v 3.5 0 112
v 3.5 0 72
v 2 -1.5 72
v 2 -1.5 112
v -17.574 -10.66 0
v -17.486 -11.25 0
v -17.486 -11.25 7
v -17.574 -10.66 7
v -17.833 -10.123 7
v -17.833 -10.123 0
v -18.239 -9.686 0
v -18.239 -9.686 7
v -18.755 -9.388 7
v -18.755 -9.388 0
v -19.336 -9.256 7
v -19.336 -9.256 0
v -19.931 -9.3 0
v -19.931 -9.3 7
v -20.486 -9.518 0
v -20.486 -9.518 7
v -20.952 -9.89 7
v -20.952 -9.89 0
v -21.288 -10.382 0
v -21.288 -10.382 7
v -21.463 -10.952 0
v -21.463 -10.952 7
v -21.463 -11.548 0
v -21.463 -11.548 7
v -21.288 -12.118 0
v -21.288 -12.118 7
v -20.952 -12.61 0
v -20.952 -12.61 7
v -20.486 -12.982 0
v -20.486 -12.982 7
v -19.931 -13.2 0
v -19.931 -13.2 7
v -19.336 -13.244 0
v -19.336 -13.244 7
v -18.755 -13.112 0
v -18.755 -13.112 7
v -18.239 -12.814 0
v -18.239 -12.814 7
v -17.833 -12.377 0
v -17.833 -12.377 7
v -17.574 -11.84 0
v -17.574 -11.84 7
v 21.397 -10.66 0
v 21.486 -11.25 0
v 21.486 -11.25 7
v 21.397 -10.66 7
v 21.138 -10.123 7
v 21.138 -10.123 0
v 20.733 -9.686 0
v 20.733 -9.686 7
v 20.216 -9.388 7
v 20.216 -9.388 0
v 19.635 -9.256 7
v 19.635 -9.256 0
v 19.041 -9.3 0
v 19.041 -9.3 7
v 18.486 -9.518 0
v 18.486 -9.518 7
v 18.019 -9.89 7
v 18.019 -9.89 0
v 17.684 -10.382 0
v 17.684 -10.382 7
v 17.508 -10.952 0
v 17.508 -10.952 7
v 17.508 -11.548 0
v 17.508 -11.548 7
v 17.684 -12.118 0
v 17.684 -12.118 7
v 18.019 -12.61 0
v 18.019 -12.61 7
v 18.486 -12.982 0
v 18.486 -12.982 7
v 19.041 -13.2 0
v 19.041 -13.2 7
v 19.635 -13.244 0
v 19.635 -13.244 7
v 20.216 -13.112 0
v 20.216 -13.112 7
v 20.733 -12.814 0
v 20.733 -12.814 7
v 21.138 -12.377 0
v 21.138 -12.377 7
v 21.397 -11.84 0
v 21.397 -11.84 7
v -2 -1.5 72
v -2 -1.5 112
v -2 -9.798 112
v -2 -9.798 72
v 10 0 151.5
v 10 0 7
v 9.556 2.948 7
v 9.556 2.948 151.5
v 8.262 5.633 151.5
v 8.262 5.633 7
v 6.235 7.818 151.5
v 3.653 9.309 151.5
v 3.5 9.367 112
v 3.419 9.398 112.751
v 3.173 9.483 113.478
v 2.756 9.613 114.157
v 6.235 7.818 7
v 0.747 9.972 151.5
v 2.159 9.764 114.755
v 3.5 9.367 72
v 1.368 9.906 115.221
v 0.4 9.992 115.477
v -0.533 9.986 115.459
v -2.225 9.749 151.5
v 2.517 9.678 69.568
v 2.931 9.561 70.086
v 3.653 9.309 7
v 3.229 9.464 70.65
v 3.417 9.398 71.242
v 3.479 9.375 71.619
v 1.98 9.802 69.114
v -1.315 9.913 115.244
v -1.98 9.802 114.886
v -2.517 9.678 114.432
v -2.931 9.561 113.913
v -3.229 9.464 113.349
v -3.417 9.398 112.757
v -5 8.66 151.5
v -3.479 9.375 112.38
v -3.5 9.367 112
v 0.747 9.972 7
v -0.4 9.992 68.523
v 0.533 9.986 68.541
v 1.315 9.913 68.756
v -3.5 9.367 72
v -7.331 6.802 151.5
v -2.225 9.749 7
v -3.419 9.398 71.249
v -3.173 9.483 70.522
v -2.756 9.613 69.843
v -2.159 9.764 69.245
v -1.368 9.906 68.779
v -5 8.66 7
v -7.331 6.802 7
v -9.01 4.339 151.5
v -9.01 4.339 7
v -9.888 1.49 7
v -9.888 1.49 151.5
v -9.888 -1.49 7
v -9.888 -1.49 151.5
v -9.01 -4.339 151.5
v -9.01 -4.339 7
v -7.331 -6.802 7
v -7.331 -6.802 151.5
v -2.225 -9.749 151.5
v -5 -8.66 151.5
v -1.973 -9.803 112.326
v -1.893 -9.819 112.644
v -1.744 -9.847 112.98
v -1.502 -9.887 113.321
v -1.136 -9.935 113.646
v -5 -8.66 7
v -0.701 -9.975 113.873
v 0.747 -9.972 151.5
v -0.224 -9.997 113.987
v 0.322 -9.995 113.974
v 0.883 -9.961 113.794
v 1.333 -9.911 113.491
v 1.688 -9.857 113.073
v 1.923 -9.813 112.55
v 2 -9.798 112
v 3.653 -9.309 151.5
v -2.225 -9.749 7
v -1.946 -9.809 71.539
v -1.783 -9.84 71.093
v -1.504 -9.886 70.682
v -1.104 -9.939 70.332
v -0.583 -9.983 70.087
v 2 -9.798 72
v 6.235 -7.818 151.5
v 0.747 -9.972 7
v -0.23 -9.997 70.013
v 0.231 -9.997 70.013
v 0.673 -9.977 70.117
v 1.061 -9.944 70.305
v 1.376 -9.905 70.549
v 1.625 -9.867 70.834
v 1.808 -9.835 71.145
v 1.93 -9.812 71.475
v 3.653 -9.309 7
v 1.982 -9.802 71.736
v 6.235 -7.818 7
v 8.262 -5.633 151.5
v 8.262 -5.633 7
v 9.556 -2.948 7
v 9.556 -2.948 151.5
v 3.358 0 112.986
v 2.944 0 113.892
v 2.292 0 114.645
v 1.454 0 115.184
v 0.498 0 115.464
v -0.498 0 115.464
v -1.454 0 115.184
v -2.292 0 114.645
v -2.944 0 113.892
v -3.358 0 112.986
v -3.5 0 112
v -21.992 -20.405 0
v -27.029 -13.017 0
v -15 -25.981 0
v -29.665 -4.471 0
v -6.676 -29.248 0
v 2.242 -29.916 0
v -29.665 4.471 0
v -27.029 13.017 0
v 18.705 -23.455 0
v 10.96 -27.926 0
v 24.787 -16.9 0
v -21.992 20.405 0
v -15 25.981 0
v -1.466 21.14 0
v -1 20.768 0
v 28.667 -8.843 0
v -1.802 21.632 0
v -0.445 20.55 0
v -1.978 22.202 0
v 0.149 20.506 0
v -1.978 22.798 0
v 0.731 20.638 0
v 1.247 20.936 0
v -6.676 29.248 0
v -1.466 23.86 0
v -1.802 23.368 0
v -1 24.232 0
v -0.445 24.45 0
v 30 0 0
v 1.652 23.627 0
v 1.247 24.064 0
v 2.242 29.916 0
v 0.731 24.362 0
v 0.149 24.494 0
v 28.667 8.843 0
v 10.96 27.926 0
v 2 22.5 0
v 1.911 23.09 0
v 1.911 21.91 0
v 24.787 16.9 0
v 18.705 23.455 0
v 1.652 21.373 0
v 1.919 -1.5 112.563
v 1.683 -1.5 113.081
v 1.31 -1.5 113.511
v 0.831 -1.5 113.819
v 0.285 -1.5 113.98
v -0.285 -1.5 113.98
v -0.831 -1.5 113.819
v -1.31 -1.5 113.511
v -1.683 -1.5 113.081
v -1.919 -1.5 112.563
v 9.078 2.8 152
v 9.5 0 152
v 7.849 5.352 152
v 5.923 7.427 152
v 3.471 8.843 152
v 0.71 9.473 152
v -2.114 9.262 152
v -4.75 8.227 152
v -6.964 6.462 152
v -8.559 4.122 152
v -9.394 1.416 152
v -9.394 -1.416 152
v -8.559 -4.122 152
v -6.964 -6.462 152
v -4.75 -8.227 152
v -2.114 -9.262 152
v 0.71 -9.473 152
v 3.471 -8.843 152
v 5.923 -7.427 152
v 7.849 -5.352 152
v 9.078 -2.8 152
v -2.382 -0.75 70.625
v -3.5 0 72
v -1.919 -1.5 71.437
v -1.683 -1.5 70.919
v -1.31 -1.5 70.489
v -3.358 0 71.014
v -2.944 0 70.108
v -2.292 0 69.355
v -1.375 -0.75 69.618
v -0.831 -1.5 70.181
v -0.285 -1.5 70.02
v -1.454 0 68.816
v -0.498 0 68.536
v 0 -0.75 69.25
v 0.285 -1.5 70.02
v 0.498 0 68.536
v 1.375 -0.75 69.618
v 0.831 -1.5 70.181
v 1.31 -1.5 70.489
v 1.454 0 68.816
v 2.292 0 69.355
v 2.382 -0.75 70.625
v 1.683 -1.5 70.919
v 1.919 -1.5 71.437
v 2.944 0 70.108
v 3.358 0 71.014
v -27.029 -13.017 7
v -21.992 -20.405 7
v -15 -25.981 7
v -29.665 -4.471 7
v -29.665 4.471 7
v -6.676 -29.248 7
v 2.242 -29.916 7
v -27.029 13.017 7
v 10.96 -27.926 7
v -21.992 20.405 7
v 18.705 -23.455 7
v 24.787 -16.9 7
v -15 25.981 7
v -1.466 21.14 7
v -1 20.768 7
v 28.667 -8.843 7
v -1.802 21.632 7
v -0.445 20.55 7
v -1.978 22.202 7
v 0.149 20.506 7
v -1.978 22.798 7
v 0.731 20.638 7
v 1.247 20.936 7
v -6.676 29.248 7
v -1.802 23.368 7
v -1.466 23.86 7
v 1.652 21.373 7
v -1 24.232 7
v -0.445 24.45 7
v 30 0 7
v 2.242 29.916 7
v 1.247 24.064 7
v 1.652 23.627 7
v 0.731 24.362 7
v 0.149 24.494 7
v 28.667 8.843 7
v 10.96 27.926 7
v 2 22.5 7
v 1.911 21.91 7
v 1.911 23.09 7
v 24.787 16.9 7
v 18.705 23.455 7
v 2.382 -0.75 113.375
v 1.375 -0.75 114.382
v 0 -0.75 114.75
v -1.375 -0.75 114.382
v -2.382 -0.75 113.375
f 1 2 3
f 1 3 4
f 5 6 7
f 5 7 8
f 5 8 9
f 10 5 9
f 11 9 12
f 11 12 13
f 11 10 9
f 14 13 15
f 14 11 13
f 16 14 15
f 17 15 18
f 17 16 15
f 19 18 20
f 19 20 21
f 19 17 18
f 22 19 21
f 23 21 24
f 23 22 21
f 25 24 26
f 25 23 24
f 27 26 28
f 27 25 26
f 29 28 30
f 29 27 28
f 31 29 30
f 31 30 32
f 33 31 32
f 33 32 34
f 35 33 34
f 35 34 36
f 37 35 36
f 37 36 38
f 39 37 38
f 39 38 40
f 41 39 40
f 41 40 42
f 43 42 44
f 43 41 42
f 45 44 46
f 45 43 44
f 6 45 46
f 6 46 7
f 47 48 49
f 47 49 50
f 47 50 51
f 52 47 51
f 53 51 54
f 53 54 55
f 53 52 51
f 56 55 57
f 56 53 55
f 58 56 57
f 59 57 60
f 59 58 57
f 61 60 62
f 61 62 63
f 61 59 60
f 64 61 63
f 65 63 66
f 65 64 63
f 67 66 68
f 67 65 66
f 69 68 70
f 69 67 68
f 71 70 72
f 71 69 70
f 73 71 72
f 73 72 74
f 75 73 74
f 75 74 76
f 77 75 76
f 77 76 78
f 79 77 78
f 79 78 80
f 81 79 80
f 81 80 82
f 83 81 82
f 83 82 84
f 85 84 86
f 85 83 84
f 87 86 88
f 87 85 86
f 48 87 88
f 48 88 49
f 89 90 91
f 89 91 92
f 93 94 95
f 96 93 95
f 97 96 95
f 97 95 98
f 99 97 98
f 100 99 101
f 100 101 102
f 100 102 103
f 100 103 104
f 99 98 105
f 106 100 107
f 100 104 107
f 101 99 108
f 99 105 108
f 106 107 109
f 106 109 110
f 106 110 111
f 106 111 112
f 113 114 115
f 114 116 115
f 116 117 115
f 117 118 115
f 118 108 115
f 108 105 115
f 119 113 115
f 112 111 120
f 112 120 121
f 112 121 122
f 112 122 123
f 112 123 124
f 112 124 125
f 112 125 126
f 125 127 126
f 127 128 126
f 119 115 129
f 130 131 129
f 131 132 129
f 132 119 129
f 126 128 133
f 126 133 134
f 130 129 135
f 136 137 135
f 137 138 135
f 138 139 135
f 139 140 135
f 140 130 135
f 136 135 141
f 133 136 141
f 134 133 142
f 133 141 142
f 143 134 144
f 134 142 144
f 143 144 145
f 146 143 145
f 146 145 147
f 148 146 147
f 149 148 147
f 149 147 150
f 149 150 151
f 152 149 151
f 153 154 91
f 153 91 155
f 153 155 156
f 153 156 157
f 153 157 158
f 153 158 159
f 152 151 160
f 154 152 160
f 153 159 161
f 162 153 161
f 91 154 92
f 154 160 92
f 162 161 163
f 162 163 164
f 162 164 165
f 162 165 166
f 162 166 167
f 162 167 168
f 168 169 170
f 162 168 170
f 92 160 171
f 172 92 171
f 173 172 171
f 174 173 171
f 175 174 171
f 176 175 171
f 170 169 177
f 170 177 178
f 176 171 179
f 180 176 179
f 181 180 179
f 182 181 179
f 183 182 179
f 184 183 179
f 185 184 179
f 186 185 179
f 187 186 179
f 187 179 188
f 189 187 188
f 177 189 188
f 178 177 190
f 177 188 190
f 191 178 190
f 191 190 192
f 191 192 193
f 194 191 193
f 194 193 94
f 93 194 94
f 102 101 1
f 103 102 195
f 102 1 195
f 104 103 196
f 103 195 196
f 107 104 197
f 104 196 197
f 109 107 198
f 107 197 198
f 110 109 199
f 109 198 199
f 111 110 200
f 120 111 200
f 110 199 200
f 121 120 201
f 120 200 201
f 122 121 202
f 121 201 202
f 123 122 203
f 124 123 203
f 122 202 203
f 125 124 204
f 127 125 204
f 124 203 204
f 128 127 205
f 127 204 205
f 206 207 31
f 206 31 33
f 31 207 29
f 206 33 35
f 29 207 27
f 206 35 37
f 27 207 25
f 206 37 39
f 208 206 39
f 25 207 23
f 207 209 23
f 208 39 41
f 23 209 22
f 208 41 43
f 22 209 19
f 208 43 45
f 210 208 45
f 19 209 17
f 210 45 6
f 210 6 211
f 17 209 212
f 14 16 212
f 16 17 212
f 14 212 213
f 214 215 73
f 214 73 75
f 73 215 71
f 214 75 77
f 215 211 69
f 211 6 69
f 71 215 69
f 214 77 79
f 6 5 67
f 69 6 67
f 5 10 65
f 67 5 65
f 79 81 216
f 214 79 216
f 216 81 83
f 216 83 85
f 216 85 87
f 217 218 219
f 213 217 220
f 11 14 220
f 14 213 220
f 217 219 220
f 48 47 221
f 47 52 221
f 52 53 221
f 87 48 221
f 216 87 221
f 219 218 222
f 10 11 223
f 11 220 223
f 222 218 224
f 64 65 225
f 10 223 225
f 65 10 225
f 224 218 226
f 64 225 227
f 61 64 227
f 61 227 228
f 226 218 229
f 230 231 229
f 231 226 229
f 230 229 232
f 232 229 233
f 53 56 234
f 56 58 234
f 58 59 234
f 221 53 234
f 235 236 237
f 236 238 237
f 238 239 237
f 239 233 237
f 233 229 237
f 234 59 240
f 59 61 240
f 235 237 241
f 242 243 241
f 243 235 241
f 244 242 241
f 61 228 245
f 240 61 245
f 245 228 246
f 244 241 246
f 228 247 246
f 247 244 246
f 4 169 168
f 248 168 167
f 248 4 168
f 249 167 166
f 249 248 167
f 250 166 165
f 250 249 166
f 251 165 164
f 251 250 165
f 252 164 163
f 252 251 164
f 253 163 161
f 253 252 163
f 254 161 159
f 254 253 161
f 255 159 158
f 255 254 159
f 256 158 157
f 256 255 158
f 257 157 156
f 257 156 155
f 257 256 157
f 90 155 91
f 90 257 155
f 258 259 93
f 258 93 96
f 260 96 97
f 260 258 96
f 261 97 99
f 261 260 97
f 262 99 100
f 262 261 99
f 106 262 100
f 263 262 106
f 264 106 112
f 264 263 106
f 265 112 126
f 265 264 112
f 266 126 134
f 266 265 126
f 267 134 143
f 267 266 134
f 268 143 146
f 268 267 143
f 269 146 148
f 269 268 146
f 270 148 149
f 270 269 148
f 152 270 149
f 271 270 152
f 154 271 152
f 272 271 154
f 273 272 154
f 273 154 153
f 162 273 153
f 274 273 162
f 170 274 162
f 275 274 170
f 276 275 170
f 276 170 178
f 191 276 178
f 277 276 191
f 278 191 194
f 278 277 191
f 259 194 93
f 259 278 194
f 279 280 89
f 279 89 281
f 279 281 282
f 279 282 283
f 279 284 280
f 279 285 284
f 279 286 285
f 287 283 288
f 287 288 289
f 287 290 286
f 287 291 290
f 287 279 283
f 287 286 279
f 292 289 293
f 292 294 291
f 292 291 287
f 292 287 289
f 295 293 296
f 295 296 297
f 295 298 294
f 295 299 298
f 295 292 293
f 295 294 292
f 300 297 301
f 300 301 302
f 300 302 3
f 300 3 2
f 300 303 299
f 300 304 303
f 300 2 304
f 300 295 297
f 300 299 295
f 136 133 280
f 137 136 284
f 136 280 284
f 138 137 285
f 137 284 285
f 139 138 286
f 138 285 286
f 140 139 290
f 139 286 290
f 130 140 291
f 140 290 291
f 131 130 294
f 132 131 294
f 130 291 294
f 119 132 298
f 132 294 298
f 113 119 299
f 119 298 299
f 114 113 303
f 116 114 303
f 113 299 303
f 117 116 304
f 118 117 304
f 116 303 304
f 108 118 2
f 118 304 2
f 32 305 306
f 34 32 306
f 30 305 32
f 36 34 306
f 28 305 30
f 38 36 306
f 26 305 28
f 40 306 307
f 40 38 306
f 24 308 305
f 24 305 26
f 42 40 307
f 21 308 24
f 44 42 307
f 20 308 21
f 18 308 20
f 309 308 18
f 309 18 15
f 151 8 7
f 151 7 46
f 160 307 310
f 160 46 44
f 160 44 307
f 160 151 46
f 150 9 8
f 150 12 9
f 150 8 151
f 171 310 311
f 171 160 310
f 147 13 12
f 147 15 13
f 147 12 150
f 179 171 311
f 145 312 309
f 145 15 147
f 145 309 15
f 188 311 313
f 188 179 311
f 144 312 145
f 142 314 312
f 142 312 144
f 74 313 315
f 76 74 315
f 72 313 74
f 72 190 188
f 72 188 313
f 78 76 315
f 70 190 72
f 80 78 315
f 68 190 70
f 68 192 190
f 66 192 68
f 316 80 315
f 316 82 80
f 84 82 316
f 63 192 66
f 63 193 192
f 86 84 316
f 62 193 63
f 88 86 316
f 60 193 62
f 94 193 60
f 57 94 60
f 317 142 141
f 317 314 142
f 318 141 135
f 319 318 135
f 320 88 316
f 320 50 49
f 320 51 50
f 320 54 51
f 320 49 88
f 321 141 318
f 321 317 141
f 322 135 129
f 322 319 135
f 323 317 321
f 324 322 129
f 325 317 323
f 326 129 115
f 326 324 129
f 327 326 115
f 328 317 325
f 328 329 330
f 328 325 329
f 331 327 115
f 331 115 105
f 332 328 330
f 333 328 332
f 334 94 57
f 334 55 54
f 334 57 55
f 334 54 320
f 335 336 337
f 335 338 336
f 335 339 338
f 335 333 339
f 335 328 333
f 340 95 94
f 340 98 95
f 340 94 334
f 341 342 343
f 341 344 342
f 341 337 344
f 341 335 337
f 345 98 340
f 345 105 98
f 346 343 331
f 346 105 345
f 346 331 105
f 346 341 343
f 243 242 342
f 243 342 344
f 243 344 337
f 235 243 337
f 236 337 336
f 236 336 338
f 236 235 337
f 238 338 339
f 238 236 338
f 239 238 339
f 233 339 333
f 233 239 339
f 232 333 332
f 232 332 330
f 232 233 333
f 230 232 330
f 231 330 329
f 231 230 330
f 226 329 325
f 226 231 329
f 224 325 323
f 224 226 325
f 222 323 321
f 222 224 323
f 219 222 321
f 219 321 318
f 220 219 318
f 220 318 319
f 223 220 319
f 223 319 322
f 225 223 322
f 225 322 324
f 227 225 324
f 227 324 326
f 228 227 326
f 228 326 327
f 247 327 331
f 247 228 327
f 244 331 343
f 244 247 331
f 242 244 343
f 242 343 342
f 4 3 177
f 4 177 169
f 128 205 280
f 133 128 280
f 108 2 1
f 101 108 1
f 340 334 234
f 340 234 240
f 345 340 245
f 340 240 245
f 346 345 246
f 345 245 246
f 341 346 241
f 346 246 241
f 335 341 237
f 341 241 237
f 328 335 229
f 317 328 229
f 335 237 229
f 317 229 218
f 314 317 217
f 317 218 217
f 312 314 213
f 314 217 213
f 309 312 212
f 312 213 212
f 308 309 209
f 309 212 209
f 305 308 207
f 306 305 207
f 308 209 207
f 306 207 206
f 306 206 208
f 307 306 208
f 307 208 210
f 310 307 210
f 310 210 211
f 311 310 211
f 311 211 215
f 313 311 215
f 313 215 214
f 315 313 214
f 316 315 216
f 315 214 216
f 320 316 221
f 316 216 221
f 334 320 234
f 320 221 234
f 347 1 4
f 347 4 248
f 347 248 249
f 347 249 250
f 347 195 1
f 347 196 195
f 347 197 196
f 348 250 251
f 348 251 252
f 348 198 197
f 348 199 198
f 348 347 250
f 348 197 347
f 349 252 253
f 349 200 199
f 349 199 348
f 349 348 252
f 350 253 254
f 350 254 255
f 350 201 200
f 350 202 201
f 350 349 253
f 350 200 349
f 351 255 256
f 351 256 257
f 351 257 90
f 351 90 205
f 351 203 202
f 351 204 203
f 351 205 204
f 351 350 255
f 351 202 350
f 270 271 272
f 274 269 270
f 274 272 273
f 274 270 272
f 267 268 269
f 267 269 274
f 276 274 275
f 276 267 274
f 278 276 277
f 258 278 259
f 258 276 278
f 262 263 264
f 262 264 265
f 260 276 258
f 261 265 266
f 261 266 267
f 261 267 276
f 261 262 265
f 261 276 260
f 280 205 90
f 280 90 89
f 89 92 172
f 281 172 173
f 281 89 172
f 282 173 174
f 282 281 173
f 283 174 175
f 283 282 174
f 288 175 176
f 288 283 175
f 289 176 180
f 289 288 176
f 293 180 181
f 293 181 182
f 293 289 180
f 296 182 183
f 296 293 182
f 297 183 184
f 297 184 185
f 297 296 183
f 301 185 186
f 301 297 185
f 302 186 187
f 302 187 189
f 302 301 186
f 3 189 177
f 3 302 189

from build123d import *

# Parameters (mm, degrees)
SKETCH1_R               = 30
SKETCH1_R_2             = 2
BOSS_EXTRUDE1_DEPTH     = 7
SKETCH2_R               = 10
BOSS_EXTRUDE2_DEPTH     = 145
CUT_EXTRUDE1_DEPTH      = 25
CUT_EXTRUDE1_DEPTH_BACK = 1.5
CHAMFER2_SIZE           = 1.5
CUT_EXTRUDE2_DEPTH      = 25
CHAMFER1_SIZE           = 0.5


with BuildPart() as part:
    # Sketch1 → Boss-Extrude1 (new body)
    with BuildSketch(Plane.XY):
        Circle(SKETCH1_R)
        with Locations((0, 22.5)):
            Circle(SKETCH1_R_2, mode=Mode.SUBTRACT)
        with Locations((19.485571585, -11.25)):
            Circle(SKETCH1_R_2, mode=Mode.SUBTRACT)
        with Locations((-19.485571585, -11.25)):
            Circle(SKETCH1_R_2, mode=Mode.SUBTRACT)
    extrude(amount=BOSS_EXTRUDE1_DEPTH)

    # Sketch2 → Boss-Extrude2 (add)
    with BuildSketch(Plane.XY.offset(7)):
        Circle(SKETCH2_R)
    extrude(amount=BOSS_EXTRUDE2_DEPTH)

    # Sketch3 → Cut-Extrude1 (cut, two sides)
    with BuildSketch(Plane(origin=(0, 0, 0), x_dir=(1, 0, 0), z_dir=(0, 1, 0))) as cut_extrude1_sk:
        with BuildLine():
            Line((3.5, -72), (3.5, -112))
            ThreePointArc((3.5, -112), (0, -115.5), (-3.5, -112))
            Line((-3.5, -112), (-3.5, -72))
            ThreePointArc((-3.5, -72), (0, -68.5), (3.5, -72))
        make_face()
    extrude(amount=CUT_EXTRUDE1_DEPTH, mode=Mode.SUBTRACT)
    extrude(cut_extrude1_sk.sketch, amount=-CUT_EXTRUDE1_DEPTH_BACK, mode=Mode.SUBTRACT)

    # Chamfer2
    chamfer2_edges = [part.edges().sort_by_distance(p)[0] for p in [
        (0, -1.5, 68.5),
        (3.5, -1.5, 92),
        (0, -1.5, 115.5),
        (-3.5, -1.5, 92),
    ]]
    chamfer(chamfer2_edges, length=CHAMFER2_SIZE)

    # Sketch4 → Cut-Extrude2 (cut)
    with BuildSketch(Plane(origin=(0, 0, 0), x_dir=(1, 0, 0), z_dir=(0, 1, 0))):
        with BuildLine():
            Line((2, -72), (2, -112))
            ThreePointArc((2, -112), (0, -114), (-2, -112))
            Line((-2, -112), (-2, -72))
            ThreePointArc((-2, -72), (0, -70), (2, -72))
        make_face()
    extrude(amount=-CUT_EXTRUDE2_DEPTH, mode=Mode.SUBTRACT)

    # Chamfer1
    chamfer1_edges = [part.edges().sort_by_distance(p)[0] for p in [
        (-10, 0, 152),
    ]]
    chamfer(chamfer1_edges, length=CHAMFER1_SIZE)


solid = part.part
